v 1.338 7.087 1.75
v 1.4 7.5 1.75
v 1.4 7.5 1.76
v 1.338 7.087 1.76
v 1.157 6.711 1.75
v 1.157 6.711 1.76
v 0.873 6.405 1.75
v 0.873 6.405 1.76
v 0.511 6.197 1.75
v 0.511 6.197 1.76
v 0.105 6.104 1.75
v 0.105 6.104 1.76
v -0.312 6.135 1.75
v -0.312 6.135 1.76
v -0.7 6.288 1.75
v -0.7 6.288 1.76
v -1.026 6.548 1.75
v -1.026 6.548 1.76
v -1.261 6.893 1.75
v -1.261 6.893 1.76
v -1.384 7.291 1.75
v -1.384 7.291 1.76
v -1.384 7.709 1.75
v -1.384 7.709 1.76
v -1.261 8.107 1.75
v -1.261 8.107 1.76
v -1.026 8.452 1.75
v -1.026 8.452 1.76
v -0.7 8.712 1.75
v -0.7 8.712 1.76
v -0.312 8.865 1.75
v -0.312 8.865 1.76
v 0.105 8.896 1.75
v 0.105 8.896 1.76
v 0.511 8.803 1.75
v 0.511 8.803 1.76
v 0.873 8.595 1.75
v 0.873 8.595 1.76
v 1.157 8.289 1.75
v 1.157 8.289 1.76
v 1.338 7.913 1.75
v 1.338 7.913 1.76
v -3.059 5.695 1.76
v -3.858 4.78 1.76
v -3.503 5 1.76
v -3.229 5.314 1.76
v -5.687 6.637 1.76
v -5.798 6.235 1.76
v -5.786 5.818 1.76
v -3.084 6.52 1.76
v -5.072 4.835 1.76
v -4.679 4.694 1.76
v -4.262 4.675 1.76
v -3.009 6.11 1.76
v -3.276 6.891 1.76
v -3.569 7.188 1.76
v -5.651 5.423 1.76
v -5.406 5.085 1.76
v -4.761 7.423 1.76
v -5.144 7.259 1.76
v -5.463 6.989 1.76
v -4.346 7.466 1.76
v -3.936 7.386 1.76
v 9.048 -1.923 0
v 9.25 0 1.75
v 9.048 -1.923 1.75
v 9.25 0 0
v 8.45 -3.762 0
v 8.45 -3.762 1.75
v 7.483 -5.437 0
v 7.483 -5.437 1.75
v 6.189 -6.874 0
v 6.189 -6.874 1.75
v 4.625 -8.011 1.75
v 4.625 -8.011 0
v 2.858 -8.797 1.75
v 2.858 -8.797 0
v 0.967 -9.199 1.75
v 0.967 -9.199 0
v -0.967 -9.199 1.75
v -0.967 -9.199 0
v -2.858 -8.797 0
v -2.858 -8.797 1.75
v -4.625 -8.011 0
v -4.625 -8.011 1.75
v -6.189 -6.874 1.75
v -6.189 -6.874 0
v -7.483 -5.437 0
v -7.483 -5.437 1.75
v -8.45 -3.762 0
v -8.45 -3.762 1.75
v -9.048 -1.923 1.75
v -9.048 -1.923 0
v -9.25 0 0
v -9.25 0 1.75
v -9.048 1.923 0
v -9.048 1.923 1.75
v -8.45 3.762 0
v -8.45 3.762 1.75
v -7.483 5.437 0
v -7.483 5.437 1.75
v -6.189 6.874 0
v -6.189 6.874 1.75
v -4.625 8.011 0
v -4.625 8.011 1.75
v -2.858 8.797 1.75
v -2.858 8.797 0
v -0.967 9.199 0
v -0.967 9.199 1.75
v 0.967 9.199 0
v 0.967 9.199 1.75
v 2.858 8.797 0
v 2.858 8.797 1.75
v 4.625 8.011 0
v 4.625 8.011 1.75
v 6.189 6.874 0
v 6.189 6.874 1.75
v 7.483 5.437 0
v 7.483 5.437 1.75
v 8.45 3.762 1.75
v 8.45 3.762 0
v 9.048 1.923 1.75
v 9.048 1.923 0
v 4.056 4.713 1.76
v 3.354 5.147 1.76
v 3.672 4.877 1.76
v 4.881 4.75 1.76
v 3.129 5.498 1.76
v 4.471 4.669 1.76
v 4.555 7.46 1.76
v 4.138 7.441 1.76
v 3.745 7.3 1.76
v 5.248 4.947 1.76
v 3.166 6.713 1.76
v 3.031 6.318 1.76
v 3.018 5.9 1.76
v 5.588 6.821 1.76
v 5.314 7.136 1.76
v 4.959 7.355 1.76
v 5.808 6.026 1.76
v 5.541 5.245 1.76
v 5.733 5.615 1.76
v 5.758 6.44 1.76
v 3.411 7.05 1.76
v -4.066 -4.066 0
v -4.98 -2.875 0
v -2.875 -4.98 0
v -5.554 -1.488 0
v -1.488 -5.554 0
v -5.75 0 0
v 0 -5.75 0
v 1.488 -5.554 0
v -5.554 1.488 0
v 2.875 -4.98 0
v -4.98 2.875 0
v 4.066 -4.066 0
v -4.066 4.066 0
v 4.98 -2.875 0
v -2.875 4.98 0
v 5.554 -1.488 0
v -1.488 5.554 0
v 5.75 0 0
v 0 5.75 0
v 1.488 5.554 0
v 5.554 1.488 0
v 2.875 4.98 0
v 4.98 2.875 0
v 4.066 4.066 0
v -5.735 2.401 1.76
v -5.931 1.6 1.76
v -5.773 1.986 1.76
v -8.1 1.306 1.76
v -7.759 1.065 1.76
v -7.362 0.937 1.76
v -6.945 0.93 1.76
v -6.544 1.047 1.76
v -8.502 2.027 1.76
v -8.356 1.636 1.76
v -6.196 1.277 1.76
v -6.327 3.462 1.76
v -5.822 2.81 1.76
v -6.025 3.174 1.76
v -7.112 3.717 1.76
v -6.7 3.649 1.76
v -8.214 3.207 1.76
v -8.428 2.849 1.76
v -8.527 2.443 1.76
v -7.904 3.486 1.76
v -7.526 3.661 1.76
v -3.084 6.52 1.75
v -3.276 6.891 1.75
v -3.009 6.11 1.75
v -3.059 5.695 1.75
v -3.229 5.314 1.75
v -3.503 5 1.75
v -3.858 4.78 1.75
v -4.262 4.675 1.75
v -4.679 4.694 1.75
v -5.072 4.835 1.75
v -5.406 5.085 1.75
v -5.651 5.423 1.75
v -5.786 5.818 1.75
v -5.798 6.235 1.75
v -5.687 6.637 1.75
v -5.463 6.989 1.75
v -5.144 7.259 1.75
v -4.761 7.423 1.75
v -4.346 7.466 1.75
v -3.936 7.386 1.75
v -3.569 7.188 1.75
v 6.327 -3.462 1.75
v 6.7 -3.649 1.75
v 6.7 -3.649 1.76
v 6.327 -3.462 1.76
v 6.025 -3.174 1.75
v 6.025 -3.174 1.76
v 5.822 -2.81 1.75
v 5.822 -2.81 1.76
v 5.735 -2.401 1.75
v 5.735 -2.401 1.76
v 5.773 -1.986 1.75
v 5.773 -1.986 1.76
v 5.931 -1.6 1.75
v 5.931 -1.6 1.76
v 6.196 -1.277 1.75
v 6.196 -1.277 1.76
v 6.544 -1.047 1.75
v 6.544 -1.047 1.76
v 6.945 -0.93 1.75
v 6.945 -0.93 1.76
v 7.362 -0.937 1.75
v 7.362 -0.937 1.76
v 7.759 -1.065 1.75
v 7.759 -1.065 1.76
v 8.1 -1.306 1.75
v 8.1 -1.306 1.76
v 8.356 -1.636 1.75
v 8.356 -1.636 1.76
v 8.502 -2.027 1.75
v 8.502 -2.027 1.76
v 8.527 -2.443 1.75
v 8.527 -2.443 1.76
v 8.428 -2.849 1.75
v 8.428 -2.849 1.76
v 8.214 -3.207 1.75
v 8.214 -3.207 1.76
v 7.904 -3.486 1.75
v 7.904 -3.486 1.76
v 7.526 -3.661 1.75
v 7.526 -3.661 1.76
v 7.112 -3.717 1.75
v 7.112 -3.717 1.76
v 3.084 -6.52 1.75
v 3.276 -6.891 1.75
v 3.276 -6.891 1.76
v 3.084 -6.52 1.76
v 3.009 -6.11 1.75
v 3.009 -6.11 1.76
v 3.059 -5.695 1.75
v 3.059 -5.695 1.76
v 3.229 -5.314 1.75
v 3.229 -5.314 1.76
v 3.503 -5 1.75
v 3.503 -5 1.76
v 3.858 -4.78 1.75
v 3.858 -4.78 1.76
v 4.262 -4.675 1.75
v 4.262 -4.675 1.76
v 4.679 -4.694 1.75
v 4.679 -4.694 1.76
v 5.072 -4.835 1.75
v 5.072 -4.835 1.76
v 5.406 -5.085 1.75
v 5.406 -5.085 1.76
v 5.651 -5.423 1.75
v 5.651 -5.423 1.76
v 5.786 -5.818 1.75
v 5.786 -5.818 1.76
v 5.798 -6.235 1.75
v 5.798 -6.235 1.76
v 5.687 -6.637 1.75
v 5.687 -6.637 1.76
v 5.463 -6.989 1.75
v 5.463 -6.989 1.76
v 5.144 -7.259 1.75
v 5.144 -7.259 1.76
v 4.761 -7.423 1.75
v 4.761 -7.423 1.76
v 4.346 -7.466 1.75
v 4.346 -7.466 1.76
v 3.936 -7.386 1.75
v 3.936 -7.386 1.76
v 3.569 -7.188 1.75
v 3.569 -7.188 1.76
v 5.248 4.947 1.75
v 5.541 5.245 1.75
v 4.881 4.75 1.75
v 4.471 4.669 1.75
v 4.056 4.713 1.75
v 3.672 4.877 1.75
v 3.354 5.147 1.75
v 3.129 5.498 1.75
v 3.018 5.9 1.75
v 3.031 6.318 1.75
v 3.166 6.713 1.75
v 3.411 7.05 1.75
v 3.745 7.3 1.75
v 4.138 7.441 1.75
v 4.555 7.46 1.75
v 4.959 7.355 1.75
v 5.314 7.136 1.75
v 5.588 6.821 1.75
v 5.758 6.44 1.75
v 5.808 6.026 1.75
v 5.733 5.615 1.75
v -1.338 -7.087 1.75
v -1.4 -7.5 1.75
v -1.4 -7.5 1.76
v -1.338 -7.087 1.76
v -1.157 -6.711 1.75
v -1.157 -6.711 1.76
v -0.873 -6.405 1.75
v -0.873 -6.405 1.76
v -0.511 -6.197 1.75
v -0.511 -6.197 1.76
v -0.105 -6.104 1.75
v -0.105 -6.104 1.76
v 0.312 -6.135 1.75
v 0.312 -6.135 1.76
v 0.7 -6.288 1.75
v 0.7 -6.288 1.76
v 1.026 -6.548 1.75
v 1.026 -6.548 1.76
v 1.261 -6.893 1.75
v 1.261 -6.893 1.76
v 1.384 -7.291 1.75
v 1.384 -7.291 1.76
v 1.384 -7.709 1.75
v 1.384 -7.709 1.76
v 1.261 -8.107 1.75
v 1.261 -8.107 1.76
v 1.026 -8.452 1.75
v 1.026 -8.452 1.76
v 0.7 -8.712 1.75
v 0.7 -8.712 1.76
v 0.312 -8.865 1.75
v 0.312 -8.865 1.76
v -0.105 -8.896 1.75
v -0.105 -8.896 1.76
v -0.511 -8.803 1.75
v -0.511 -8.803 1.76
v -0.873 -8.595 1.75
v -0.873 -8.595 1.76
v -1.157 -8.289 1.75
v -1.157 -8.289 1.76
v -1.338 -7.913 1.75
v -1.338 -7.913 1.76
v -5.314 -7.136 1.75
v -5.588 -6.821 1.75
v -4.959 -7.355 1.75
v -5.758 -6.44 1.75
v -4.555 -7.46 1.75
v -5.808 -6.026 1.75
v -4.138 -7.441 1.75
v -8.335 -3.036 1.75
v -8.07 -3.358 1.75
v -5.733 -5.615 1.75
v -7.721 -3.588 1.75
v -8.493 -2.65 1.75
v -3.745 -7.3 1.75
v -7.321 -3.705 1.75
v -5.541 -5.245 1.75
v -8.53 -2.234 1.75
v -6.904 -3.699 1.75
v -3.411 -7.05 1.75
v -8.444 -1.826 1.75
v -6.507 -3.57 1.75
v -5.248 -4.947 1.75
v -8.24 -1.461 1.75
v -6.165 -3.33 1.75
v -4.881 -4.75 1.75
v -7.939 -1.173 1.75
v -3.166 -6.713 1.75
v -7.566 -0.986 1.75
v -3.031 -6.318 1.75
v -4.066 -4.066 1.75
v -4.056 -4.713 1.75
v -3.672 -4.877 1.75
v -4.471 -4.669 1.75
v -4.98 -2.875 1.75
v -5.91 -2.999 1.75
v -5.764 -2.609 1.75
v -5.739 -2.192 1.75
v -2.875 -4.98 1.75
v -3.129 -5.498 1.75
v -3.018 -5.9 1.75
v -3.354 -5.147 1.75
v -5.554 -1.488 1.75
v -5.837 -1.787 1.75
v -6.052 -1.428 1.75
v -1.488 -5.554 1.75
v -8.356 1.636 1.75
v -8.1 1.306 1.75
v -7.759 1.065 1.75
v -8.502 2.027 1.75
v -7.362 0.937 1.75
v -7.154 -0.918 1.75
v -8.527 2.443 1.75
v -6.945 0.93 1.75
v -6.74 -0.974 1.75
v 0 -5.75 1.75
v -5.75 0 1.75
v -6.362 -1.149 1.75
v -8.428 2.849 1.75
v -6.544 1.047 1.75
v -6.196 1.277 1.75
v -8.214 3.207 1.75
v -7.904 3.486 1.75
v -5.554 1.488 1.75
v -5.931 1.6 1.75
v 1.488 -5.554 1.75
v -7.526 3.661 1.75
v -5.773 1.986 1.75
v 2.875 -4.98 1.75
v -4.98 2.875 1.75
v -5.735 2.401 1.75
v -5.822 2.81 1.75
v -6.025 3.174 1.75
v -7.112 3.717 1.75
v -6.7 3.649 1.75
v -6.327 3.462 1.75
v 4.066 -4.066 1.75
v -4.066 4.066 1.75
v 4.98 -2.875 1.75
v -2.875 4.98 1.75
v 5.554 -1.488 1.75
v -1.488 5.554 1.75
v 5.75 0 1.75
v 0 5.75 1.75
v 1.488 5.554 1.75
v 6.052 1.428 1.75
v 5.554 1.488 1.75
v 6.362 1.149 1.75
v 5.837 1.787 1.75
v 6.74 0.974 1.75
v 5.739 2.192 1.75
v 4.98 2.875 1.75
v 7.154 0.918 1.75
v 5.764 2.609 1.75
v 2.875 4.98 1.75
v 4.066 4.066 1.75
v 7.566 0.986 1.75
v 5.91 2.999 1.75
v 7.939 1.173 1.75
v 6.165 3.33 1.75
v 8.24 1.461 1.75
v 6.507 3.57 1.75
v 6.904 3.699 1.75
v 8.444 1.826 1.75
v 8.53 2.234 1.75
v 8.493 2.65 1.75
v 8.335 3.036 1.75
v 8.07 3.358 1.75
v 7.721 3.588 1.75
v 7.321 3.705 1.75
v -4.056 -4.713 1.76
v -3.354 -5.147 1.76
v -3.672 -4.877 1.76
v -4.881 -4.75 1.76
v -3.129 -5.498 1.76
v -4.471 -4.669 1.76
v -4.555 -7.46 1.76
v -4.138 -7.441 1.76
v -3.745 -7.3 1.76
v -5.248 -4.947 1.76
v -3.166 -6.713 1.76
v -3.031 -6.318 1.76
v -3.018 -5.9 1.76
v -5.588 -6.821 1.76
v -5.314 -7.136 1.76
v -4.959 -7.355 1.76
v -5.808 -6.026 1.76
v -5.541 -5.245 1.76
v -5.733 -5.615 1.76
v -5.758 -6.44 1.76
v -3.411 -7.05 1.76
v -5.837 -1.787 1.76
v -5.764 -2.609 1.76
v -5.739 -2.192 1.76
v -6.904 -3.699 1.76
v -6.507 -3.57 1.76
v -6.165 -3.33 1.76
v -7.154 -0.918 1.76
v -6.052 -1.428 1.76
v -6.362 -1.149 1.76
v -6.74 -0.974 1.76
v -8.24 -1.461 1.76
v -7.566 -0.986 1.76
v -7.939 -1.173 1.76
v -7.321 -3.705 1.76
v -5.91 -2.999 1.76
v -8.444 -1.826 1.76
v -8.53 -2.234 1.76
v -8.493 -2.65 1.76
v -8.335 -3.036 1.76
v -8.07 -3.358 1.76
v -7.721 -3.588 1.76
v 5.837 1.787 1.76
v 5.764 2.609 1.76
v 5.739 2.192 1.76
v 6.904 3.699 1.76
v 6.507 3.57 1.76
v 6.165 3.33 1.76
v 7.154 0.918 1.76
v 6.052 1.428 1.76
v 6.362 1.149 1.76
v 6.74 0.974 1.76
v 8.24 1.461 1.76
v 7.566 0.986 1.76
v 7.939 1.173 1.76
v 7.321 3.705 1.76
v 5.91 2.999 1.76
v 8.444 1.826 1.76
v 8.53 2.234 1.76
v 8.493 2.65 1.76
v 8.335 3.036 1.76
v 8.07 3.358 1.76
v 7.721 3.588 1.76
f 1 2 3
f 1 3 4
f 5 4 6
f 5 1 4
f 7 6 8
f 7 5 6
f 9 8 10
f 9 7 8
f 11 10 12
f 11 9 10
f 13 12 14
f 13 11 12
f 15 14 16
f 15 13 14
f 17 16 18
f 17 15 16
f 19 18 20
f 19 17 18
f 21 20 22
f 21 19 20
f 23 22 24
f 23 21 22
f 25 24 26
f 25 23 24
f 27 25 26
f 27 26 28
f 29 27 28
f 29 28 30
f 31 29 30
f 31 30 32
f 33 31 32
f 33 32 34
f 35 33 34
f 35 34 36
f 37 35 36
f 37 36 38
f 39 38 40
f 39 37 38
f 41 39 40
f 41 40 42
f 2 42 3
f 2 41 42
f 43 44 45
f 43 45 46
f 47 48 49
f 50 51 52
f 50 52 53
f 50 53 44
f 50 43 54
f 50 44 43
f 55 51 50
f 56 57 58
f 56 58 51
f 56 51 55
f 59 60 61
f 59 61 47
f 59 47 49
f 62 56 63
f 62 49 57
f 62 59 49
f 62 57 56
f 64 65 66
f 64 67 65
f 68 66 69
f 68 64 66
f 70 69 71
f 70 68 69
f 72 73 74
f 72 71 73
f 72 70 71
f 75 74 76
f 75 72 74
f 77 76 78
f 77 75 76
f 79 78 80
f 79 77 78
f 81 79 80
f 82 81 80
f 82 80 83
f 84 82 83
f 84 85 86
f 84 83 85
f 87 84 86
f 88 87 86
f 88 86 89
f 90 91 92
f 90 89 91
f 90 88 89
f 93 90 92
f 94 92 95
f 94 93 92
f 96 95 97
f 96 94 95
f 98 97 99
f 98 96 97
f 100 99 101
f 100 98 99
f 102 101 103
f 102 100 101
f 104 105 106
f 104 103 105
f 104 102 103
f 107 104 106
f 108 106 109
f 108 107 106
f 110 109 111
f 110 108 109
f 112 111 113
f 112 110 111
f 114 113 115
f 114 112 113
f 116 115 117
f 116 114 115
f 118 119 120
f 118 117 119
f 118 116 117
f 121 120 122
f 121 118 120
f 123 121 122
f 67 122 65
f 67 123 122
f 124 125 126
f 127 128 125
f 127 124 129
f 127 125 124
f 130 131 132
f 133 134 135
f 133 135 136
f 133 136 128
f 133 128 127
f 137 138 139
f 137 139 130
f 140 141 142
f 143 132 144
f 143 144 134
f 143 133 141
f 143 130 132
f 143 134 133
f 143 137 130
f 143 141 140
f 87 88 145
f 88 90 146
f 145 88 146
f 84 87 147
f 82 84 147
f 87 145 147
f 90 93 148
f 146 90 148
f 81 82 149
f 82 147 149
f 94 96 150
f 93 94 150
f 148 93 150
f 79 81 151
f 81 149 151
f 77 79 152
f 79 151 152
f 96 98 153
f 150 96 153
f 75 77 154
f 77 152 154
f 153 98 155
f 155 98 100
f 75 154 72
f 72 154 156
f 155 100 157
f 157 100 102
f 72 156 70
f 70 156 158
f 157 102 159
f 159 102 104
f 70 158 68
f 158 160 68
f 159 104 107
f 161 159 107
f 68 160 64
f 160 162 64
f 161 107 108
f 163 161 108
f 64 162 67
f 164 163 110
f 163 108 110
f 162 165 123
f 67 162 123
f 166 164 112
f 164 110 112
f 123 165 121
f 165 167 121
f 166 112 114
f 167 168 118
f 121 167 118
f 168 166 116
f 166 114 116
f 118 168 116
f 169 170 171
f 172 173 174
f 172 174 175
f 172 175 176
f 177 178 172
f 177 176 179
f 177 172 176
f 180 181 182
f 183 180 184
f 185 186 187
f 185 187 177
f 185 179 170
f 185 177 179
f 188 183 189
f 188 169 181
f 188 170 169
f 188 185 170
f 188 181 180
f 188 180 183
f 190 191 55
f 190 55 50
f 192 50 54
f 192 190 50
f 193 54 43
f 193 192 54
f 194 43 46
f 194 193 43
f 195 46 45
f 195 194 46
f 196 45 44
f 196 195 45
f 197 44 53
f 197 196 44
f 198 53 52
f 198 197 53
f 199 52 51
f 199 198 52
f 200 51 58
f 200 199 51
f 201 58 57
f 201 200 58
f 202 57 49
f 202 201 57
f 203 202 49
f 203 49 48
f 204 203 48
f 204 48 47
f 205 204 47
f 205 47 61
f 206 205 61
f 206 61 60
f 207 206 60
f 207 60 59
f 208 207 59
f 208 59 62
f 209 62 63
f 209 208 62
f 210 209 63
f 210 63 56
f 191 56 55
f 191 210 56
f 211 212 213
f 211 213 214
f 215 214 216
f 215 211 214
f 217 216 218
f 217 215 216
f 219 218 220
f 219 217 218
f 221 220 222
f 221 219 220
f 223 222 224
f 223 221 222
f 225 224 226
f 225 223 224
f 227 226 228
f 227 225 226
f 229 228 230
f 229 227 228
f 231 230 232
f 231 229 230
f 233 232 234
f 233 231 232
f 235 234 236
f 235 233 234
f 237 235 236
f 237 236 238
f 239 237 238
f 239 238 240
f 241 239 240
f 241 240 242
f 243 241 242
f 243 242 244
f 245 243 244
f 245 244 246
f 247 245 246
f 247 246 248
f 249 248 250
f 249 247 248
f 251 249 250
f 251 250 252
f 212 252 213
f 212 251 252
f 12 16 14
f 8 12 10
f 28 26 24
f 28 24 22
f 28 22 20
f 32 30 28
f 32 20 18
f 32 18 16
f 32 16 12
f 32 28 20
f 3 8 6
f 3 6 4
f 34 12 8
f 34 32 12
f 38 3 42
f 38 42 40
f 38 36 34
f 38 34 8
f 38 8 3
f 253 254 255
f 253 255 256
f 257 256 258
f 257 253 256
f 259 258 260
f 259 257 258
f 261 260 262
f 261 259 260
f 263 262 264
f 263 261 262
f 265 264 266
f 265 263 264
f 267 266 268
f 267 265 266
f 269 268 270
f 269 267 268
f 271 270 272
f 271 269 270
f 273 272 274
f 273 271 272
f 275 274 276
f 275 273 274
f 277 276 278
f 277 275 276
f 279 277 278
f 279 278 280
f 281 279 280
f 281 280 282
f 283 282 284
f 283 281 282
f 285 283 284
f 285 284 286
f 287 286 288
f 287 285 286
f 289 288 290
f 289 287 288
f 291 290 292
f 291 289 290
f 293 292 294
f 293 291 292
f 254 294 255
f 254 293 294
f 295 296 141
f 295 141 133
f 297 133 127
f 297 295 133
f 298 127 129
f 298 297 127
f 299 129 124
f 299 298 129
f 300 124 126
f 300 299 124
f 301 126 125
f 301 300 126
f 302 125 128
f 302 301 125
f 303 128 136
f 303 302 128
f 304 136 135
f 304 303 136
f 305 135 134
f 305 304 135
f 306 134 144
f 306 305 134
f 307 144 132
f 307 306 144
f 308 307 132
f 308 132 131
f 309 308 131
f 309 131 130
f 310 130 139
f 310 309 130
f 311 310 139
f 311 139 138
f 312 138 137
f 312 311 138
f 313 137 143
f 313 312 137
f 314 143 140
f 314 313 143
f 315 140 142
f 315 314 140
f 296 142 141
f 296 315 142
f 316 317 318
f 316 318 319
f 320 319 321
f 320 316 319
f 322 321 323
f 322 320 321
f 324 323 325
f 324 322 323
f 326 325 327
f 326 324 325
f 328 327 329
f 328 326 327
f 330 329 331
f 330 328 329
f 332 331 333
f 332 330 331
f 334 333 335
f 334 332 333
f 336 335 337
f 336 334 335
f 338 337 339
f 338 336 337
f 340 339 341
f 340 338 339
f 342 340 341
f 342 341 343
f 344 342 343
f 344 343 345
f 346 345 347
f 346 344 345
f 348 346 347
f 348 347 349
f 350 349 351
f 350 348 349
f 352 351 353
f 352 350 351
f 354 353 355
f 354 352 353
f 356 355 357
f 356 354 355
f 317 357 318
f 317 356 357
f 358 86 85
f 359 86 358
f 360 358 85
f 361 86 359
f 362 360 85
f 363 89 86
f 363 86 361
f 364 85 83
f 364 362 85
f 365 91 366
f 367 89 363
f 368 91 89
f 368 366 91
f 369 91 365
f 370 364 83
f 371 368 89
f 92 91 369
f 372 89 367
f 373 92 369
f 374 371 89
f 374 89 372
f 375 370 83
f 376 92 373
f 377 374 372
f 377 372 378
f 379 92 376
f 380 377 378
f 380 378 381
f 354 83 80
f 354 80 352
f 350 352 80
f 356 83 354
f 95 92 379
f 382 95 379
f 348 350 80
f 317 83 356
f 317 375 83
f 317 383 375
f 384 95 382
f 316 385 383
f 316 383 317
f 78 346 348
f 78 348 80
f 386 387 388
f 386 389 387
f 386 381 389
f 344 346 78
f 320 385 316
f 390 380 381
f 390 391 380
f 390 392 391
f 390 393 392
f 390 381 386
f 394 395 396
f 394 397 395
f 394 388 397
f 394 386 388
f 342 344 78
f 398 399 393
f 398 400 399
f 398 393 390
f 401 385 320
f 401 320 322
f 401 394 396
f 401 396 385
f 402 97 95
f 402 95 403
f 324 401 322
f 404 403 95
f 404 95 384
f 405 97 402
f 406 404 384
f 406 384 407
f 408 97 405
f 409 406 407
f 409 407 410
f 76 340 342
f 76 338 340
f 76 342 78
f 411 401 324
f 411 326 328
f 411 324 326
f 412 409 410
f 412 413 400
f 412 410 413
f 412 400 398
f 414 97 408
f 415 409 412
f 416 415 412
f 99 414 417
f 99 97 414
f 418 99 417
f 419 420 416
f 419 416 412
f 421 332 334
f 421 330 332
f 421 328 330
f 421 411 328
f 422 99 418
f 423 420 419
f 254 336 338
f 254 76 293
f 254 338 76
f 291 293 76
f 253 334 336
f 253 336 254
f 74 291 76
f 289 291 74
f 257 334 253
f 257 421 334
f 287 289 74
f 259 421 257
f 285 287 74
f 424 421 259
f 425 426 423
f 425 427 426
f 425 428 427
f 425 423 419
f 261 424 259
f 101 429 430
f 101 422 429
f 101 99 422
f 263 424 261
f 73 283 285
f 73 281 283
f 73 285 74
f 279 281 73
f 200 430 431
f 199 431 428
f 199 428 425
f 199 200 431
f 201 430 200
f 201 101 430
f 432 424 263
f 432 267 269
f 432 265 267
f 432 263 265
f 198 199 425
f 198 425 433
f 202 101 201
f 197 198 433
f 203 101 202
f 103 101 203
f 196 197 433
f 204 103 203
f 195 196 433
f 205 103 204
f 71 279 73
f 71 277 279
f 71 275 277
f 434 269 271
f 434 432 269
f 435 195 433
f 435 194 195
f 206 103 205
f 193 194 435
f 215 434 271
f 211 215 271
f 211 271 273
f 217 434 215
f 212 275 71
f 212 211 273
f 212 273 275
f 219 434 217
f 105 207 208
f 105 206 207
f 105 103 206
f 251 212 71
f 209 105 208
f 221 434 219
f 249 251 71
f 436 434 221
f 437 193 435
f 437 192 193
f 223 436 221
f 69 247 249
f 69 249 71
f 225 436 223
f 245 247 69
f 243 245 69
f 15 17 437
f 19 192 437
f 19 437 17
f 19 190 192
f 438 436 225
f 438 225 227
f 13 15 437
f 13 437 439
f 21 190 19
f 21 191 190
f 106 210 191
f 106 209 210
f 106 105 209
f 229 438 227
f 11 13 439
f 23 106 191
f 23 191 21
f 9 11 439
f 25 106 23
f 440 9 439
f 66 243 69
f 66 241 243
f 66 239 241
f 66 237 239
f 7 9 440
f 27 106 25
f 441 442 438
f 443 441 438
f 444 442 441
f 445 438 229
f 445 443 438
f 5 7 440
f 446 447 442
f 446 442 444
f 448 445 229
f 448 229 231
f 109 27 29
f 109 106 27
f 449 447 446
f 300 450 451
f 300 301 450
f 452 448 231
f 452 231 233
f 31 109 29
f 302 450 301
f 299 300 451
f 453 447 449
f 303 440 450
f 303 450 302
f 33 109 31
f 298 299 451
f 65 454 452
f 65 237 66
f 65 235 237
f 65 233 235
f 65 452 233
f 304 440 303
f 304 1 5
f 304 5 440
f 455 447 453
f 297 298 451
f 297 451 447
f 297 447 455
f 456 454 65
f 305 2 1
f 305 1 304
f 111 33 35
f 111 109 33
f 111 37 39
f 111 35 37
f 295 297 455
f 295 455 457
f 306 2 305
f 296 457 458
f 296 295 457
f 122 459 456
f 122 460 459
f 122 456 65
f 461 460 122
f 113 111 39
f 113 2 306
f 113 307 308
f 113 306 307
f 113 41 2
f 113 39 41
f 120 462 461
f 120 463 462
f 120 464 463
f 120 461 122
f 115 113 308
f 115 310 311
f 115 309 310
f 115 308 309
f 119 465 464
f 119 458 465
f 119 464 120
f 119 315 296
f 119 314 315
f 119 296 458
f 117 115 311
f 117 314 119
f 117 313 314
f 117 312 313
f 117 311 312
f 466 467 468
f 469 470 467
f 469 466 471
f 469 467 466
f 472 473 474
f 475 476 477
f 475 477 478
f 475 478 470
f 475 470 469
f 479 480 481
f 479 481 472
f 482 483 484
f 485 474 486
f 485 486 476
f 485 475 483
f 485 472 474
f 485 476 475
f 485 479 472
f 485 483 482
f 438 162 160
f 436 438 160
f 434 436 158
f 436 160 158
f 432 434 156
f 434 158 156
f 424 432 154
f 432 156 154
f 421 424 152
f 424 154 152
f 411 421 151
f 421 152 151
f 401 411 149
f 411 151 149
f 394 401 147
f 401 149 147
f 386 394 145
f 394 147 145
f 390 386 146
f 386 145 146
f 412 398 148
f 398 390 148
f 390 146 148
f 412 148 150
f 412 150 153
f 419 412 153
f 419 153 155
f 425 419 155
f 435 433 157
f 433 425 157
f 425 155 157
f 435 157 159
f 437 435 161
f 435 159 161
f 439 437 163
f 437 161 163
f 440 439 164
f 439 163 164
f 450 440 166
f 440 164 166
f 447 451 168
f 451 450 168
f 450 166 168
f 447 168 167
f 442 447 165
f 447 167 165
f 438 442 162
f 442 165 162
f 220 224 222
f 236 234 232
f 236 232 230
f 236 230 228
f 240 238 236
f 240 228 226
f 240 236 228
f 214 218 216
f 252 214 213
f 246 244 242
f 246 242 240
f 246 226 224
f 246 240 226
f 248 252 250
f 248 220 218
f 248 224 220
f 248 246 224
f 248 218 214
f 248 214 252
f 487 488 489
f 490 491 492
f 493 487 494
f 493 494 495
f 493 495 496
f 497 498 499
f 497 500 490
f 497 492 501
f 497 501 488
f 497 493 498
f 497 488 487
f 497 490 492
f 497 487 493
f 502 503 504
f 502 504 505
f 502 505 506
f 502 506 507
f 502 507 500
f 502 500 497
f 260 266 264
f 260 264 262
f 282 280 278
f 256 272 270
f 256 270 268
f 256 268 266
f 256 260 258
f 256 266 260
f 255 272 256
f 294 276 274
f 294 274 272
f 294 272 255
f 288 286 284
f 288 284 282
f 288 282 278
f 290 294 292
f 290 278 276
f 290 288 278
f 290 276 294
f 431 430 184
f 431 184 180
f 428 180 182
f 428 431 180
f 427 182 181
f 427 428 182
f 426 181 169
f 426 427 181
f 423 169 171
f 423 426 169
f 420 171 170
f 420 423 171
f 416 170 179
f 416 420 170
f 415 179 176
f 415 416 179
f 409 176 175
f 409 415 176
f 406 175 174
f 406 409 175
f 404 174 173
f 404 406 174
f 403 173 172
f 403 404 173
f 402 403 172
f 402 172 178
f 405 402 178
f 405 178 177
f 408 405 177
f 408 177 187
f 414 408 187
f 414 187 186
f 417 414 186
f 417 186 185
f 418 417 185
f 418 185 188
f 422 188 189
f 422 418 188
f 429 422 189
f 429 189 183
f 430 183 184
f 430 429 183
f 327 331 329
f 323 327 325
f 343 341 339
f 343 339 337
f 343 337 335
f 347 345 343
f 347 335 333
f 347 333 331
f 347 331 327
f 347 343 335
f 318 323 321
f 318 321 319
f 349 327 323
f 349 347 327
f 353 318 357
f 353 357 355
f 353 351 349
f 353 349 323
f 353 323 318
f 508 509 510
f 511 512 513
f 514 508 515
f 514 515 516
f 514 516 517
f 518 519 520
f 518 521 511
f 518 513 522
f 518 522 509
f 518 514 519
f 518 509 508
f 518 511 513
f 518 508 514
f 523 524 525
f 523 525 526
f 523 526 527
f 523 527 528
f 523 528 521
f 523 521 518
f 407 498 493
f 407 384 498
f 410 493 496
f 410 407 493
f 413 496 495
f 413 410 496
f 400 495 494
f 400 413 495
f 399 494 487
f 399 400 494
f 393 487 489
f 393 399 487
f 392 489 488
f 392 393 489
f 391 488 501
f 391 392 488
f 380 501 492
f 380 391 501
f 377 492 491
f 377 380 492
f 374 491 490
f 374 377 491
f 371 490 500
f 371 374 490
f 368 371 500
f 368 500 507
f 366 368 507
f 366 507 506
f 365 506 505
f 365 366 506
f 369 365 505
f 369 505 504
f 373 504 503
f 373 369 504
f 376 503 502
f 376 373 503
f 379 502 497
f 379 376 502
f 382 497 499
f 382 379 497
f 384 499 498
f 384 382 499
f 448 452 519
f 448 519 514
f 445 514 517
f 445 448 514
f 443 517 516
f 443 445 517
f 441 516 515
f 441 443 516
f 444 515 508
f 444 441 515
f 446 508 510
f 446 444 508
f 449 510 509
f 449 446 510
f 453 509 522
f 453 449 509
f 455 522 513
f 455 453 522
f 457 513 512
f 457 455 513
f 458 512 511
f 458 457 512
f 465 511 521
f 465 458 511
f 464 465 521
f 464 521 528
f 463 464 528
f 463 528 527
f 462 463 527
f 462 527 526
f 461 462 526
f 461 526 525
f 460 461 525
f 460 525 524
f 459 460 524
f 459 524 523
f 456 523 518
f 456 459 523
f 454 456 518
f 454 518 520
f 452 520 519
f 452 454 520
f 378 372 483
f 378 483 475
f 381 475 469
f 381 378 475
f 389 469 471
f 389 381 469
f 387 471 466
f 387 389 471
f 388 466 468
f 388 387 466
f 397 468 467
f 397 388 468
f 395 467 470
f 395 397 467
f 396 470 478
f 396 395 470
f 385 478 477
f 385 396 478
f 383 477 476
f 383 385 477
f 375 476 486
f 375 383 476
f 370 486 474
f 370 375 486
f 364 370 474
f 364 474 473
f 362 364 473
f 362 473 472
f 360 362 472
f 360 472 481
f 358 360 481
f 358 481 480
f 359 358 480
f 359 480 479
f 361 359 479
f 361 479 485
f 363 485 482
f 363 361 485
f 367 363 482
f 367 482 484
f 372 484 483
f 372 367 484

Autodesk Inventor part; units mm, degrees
ref_plane "YZ Plane" through (0, 0, 0) normal (1, 0, 0) x (0, 1, 0)
ref_plane "XZ Plane" through (0, 0, 0) normal (0, 1, 0) x (-1, 0, 0)
ref_plane "XY Plane" through (0, 0, 0) normal (0, 0, 1) x (1, 0, 0)
sketch "Sketch1" plane through (0, 0, 0) normal (0, 0, 1) x (1, 0, 0)
  circle A0 centre (0, 0) radius 9.25
  circle A1 centre (0, 0) radius 5.75
  dimension "d0" = 11.5
  dimension "d1" = 18.5
extrude "Extrusion1" add sketch "Sketch1" along normal blind 1.75
sketch "Sketch2" plane through (0, 0, 1.75) normal (0, 0, 1) x (1, 0, 0)
  circle A0 centre (0, 0) radius 5.75 projected
  circle A1 centre (0, 7.5) radius 1.4
  dimension "d4" = 7.5
  dimension "d5" = 2.8
extrude "Extrusion2" add sketch "Sketch2" along normal blind 0.01 contours A1
pattern_circular "Circular Pattern1" count 10 over 360 about axis through (0, 0, 0) along (0, 0, 1) of "Extrusion2"
properties part number "Capsule.contactring"
